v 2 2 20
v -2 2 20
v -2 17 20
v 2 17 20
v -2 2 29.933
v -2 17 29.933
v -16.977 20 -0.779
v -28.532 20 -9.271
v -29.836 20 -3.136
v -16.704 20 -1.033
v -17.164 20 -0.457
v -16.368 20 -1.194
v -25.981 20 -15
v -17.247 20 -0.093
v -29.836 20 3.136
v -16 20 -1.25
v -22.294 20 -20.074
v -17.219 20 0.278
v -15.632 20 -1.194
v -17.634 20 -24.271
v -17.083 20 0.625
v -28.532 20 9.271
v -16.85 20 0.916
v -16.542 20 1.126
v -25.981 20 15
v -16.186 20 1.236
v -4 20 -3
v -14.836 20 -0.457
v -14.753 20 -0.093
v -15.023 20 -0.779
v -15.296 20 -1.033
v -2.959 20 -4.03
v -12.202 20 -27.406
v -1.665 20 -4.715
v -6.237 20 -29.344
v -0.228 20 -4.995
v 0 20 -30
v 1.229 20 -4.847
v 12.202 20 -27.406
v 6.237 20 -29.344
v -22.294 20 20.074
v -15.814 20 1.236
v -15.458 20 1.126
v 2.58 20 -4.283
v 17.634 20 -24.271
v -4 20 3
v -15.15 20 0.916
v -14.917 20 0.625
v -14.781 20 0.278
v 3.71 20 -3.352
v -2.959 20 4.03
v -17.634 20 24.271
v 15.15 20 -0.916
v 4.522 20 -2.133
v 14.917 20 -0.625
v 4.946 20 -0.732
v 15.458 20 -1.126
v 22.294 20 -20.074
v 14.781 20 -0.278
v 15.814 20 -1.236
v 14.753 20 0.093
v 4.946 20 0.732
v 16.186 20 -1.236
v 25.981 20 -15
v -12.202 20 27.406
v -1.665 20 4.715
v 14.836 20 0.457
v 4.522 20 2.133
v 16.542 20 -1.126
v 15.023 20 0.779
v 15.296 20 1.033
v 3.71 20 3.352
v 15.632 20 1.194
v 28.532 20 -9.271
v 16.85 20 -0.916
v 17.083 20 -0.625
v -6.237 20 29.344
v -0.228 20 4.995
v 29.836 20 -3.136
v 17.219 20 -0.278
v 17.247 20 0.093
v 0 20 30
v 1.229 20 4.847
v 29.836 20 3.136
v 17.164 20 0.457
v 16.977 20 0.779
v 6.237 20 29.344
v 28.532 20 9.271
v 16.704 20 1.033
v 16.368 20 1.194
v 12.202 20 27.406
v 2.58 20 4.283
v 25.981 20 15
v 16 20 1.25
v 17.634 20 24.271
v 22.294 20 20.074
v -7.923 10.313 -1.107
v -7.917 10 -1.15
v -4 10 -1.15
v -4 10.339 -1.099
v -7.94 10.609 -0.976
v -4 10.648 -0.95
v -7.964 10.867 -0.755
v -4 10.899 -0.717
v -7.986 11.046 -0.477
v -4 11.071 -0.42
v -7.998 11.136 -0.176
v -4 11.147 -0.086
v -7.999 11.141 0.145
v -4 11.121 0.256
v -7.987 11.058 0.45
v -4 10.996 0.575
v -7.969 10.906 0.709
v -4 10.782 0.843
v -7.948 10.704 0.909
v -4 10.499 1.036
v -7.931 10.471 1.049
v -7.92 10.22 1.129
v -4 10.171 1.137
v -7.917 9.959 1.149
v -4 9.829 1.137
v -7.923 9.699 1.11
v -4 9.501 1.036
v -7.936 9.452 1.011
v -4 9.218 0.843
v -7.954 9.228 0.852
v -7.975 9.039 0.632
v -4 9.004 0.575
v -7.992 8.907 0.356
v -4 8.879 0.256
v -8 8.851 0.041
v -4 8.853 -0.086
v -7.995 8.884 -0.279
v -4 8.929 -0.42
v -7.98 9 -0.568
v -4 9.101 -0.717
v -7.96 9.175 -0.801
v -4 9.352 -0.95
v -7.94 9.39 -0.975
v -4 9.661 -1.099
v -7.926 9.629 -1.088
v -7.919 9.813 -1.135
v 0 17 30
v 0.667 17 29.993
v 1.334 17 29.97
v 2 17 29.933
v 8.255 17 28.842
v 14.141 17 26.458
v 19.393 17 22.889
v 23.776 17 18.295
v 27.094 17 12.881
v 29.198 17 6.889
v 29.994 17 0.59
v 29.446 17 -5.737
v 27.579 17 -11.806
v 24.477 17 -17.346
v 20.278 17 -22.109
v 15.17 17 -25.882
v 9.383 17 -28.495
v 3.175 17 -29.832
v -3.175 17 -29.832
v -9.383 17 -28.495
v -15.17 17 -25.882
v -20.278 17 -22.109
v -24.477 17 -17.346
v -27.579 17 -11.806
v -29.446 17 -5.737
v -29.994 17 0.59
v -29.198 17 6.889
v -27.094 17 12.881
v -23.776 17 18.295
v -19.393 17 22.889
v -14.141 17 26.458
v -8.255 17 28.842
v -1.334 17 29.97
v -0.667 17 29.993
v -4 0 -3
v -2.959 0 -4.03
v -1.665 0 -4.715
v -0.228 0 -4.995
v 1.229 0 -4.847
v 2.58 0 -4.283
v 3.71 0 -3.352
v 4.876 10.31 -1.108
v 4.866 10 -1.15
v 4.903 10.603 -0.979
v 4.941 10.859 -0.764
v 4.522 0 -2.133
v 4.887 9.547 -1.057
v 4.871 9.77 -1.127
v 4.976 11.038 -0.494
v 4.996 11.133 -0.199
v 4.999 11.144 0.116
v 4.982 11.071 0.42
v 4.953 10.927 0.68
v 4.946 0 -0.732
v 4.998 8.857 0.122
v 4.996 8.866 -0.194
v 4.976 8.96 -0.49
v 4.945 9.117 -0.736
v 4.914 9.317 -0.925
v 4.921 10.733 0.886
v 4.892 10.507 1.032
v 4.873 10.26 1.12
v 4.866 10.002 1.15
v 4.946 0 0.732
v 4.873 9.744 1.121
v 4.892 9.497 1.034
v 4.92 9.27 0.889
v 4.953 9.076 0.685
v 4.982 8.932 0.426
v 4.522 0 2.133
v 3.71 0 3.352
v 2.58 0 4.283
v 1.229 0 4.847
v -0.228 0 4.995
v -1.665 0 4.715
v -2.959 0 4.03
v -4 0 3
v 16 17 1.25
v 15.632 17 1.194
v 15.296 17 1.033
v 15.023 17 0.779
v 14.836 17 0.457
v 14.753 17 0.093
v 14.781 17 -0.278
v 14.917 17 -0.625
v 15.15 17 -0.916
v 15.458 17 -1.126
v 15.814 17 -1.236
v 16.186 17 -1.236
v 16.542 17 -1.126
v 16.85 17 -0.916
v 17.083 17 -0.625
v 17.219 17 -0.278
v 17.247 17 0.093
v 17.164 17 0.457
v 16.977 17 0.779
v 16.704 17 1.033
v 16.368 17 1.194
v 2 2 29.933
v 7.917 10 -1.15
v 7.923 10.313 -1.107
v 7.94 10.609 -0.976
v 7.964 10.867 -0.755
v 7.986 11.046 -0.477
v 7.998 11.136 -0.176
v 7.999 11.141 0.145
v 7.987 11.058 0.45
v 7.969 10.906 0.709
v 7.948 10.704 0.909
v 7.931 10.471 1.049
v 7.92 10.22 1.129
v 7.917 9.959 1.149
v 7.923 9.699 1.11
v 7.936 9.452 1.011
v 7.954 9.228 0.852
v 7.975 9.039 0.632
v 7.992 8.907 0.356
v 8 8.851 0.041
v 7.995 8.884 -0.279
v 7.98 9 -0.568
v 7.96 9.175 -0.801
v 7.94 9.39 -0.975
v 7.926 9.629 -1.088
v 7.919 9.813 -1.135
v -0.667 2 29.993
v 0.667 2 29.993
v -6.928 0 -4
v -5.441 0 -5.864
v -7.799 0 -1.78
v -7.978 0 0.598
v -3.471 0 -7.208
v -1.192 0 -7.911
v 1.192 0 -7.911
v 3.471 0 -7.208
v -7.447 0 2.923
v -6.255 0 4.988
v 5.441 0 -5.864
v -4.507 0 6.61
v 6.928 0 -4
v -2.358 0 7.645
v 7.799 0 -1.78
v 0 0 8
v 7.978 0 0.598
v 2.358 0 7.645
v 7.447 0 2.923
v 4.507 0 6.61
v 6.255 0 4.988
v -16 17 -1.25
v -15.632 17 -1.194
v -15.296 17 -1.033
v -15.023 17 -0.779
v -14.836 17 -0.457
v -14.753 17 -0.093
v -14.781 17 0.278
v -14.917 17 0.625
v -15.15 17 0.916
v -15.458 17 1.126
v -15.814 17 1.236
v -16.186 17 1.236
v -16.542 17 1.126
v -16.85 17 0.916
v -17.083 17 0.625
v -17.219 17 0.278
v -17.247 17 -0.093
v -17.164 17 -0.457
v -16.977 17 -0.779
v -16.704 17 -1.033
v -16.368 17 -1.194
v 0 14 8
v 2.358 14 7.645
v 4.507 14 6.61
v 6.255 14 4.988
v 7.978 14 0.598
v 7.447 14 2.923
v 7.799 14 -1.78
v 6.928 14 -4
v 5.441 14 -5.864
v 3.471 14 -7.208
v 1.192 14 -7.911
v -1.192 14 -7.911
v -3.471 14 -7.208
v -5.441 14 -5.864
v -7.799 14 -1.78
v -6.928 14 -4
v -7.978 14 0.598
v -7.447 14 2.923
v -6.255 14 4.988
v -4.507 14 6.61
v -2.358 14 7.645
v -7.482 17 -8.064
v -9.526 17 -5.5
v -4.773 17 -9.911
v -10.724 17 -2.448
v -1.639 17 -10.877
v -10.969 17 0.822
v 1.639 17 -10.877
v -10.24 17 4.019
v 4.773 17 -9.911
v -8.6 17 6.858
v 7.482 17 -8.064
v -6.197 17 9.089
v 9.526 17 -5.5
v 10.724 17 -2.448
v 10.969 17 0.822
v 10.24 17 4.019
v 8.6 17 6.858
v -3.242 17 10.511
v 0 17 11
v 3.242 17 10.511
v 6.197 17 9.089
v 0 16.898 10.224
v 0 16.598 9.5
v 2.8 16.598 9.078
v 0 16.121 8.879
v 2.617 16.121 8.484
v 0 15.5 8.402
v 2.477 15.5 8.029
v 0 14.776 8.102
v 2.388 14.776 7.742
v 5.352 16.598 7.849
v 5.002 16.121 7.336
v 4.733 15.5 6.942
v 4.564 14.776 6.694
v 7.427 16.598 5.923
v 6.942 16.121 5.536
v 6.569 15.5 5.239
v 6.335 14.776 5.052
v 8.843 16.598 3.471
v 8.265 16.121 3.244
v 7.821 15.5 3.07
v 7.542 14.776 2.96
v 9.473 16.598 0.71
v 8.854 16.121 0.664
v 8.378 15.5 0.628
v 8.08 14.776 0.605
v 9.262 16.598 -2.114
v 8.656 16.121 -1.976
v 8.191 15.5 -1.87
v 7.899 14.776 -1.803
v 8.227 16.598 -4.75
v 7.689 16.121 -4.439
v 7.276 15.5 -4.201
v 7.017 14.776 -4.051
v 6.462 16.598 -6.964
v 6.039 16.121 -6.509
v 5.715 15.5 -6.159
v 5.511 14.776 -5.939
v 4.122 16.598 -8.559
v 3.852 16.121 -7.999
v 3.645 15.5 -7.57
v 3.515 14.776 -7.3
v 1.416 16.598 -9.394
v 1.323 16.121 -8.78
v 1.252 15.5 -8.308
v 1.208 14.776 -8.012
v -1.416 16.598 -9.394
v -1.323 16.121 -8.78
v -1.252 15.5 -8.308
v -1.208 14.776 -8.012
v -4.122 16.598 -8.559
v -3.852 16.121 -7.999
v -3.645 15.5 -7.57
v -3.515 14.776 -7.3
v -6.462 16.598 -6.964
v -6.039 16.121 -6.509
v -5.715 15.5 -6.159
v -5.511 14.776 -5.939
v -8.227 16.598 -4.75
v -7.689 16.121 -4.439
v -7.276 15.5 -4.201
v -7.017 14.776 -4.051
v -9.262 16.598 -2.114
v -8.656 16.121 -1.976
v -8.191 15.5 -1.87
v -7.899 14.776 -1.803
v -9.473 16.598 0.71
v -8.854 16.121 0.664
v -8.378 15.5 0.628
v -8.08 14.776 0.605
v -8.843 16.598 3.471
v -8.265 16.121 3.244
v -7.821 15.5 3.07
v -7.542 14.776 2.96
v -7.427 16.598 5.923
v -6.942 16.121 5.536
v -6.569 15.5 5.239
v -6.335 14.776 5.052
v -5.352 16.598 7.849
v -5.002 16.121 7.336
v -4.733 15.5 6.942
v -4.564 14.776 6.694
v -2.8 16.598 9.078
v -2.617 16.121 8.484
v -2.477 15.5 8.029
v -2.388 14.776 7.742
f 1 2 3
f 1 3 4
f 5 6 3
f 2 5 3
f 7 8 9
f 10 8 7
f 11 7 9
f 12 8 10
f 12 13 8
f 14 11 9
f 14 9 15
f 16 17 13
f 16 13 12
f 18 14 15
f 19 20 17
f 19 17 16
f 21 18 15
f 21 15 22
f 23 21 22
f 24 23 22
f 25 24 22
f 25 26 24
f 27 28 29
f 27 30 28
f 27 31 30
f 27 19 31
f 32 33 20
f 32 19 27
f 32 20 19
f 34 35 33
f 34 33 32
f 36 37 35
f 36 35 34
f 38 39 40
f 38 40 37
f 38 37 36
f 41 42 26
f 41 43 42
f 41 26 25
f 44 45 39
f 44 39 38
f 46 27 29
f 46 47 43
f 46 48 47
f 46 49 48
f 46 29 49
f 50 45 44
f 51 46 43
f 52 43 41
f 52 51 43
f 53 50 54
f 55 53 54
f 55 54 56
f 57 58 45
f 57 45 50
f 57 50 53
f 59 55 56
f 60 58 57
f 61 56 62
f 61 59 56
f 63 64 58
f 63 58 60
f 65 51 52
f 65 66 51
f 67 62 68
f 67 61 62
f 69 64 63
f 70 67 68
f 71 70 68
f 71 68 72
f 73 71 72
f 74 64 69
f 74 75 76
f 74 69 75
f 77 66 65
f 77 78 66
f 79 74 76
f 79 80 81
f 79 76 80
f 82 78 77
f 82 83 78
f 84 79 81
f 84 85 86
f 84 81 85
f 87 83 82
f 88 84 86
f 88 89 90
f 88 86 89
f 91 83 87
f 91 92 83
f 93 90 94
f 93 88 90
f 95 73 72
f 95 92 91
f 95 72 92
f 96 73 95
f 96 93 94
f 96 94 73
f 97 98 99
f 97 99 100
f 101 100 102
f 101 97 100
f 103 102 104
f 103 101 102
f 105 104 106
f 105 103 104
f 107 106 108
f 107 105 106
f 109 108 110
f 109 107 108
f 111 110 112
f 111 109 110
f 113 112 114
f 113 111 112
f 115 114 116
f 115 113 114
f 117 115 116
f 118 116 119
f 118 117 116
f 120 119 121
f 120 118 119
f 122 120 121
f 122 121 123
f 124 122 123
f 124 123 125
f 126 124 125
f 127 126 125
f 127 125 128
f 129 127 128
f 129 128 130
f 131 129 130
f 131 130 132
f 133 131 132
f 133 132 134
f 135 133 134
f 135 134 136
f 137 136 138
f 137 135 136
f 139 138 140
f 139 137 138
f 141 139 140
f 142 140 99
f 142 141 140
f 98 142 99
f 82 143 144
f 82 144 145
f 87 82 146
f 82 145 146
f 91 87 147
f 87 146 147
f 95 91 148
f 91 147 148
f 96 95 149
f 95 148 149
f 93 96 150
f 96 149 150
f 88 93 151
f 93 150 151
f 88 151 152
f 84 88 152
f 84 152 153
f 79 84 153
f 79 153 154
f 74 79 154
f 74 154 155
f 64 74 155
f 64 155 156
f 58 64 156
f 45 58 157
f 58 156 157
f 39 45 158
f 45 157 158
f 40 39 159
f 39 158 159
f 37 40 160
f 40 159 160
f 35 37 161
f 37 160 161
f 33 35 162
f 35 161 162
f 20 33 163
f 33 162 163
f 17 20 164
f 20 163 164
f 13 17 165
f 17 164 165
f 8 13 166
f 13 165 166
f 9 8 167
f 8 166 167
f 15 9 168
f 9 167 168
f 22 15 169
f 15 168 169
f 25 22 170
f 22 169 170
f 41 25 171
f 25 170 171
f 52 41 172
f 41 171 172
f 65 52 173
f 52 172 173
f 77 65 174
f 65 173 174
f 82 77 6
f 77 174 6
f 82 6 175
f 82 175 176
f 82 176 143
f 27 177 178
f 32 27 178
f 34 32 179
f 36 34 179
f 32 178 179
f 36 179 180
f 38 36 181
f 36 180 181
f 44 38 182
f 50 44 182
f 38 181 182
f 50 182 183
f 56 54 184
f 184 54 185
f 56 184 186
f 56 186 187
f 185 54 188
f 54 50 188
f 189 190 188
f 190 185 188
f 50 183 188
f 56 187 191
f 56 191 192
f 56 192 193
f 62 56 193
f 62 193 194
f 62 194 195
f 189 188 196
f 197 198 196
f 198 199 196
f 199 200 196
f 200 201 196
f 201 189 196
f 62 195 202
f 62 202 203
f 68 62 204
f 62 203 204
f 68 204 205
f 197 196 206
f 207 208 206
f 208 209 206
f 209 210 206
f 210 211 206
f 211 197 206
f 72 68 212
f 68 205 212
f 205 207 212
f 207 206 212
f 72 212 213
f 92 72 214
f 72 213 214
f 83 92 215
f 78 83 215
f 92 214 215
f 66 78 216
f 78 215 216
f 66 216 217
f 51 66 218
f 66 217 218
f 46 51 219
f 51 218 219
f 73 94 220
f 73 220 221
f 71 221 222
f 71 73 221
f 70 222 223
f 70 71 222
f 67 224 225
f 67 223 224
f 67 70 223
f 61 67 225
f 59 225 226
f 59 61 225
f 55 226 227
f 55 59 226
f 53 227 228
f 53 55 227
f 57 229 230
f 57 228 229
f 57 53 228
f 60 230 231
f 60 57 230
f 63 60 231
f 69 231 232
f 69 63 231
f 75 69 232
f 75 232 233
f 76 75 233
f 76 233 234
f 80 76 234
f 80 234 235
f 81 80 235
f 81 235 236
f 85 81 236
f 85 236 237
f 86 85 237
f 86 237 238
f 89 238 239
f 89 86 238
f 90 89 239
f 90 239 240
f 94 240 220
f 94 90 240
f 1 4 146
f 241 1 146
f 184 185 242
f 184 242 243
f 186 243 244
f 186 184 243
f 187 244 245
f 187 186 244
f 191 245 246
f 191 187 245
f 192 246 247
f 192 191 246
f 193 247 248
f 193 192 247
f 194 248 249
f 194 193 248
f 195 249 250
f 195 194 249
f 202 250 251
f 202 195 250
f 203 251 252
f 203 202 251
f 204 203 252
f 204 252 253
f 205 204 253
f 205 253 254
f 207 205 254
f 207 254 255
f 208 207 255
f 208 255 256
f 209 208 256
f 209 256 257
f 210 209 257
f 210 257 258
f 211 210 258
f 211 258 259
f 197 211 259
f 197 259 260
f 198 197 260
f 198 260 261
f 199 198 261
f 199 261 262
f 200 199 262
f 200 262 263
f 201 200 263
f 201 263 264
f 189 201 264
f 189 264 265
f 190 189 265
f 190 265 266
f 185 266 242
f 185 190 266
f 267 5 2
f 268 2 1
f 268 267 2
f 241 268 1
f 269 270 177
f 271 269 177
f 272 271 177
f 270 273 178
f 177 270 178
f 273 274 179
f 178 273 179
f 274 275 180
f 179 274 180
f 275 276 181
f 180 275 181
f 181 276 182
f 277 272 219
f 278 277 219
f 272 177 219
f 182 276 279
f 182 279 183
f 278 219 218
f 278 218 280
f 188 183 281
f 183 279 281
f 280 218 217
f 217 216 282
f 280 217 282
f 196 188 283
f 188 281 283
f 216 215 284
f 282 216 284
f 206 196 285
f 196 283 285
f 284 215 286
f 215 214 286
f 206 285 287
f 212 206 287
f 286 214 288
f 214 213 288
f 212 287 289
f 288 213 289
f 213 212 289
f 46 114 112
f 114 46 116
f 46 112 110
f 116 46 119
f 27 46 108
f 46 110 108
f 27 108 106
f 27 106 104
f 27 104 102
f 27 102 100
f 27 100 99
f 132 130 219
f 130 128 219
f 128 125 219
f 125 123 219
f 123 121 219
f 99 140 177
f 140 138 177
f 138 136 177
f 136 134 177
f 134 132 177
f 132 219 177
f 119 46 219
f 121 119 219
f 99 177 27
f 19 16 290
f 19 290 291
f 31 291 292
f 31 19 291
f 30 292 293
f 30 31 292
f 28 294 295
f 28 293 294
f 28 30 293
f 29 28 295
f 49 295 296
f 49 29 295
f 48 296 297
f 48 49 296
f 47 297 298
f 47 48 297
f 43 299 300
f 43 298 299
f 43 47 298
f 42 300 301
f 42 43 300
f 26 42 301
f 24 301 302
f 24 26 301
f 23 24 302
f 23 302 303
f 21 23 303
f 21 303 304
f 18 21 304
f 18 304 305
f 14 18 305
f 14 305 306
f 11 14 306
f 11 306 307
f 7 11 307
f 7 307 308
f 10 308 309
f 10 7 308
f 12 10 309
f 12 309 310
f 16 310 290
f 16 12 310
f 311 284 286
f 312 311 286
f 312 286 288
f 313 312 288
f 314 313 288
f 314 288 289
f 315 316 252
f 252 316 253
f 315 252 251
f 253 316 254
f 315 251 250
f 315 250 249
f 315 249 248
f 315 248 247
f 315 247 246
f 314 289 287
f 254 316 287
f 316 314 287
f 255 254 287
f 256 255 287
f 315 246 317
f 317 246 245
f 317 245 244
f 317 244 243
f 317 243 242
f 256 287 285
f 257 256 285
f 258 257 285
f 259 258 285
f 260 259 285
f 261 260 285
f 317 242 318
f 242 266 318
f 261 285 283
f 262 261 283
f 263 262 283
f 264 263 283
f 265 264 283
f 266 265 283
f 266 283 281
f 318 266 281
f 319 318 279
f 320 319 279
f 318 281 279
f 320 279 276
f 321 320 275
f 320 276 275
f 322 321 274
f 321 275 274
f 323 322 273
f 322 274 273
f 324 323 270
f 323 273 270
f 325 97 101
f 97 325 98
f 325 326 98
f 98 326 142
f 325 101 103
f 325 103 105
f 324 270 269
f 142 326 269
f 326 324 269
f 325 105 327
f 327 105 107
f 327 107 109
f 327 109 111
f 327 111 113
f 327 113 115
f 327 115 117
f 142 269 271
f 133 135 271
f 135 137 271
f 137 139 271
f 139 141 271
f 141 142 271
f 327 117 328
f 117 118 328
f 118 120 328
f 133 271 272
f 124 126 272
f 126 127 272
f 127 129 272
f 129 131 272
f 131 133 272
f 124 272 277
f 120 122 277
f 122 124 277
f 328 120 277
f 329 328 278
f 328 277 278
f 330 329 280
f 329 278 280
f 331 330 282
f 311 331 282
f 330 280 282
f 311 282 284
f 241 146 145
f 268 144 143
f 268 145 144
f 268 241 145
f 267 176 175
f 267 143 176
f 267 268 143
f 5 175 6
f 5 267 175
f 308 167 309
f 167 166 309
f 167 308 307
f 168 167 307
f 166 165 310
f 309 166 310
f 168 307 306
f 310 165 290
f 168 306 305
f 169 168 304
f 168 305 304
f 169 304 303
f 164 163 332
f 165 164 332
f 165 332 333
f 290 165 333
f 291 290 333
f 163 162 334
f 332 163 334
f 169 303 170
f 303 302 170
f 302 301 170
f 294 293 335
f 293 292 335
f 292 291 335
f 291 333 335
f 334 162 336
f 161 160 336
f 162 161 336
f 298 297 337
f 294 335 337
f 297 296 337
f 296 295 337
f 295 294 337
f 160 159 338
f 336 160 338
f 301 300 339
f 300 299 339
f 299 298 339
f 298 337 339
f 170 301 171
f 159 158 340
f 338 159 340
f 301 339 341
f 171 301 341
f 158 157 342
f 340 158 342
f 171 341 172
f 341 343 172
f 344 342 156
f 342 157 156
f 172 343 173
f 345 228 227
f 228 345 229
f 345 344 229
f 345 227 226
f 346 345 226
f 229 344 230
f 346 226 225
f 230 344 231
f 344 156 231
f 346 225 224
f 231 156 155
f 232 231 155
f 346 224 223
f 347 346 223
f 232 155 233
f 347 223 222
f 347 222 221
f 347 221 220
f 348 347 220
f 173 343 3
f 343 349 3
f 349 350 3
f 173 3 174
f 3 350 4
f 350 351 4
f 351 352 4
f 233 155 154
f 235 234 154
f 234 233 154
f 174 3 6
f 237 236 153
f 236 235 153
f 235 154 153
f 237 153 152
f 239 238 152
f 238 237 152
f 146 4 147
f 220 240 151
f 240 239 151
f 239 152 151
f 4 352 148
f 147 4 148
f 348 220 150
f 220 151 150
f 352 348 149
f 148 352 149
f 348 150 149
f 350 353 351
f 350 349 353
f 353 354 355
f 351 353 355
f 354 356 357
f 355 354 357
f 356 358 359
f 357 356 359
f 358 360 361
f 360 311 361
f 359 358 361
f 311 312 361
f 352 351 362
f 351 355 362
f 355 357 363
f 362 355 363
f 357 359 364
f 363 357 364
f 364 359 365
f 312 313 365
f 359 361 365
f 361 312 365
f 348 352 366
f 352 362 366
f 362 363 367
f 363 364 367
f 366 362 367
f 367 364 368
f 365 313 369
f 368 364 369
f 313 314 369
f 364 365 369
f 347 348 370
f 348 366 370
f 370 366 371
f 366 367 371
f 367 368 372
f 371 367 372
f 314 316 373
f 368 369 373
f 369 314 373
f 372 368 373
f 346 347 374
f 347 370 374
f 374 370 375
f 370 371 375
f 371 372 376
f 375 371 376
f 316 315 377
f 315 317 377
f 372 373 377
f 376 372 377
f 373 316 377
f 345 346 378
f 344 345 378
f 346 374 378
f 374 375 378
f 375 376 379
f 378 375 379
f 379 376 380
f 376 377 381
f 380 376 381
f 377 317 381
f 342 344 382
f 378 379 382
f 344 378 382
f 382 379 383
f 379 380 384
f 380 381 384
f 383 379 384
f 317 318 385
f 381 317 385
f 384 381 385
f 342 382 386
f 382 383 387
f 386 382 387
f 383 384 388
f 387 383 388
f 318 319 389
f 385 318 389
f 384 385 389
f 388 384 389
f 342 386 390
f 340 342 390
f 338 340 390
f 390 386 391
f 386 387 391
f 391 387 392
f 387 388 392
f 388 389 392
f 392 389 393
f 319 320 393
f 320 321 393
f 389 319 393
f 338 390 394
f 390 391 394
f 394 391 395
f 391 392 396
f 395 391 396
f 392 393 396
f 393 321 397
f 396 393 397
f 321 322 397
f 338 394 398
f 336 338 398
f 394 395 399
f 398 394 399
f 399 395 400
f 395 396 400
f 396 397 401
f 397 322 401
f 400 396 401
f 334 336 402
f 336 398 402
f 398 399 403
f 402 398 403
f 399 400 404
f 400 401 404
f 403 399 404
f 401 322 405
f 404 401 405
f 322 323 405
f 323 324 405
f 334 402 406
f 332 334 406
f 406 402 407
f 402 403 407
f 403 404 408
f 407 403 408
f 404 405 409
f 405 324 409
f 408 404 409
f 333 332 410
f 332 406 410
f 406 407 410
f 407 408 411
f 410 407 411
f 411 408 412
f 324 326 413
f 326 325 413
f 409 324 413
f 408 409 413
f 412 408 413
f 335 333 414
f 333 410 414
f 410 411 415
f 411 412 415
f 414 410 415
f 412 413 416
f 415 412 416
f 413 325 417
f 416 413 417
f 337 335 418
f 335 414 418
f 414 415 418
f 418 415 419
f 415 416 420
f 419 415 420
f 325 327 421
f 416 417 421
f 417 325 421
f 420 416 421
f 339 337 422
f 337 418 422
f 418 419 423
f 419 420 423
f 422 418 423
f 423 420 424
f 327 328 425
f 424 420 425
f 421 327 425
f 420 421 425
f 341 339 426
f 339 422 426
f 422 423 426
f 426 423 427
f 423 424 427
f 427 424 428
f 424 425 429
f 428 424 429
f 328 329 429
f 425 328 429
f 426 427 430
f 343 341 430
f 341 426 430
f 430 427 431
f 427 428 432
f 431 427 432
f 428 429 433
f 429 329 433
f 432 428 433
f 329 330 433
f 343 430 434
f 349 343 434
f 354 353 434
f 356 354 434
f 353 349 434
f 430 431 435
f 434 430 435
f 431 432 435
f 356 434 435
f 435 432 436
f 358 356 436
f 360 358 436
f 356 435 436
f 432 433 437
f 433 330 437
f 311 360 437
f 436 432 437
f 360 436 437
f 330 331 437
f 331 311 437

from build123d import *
from build123d.topology import SkipClean

# Parameters (mm, degrees)
SKETCH_1_R               = 8
EXTRUDE_1_DEPTH          = 17
SKETCH_2_R               = 30
EXTRUDE_2_DEPTH          = 3
CUT_EXTRUDE_1_DEPTH      = 47.904158
CUT_EXTRUDE_2_DEPTH      = 50.558047
CUT_EXTRUDE_2_DEPTH_BACK = 50.558047
SKETCH_4_R               = 1.15
EXTRUDE_START            = 15
EXTRUDE_3_DEPTH          = 15
FILLET_1_R               = 3
CUT_EXTRUDE_3_DEPTH      = 46.70558
CUT_EXTRUDE_3_DEPTH_BACK = 46.70558
SKETCH_6_R               = 1.25


with BuildPart() as part:
    # 草图1 → 凸台-拉伸1 (new body)
    with BuildSketch(Plane(origin=(0, 0, 0), x_dir=(1, 0, 0), z_dir=(0, 1, 0))):
        with Locations(Location((0, 0, 0), (0, 0, 270))):
            Circle(SKETCH_1_R)
    extrude(amount=EXTRUDE_1_DEPTH)

    # 草图2 → 凸台-拉伸2 (add)
    with BuildSketch(Plane(origin=(0, 17, 0), x_dir=(1, 0, 0), z_dir=(0, 1, 0))):
        with Locations(Location((0, 0, 0), (0, 0, 270))):
            Circle(SKETCH_2_R)
    extrude(amount=EXTRUDE_2_DEPTH)

    # 草图3 → 切除-拉伸1 (cut, through all)
    with BuildSketch(Plane.XZ):
        with BuildLine():
            Line((-4, 3), (-4, -3))
            ThreePointArc((-4, -3), (5, 0), (-4, 3))
        make_face()
    extrude(amount=-CUT_EXTRUDE_1_DEPTH, mode=Mode.SUBTRACT)

    # 草图4 → 切除-拉伸2 (cut, two sides: drawn at the far end of the back side and taken through both)
    with BuildSketch(Plane(origin=(-4, 0, 0), x_dir=(0, 0, -1), z_dir=(1, 0, 0)).offset(-CUT_EXTRUDE_2_DEPTH_BACK)):
        with Locations((0, 10)):
            Circle(SKETCH_4_R)
    extrude(amount=CUT_EXTRUDE_2_DEPTH + CUT_EXTRUDE_2_DEPTH_BACK, mode=Mode.SUBTRACT)

    # 草图5 → 凸台-拉伸3 (add)
    with SkipClean():  # the faces are left unmerged after this step: merging them gives an invalid solid
        with BuildSketch(Plane.XZ.offset(-17).offset(EXTRUDE_START)):
            with BuildLine():
                Line((-2, 29.933259), (-2, 20))
                Line((-2, 20), (2, 20))
                Line((2, 20), (2, 29.933259))
                ThreePointArc((2, 29.933259), (0, 30), (-2, 29.933259))
            make_face()
        extrude(amount=-EXTRUDE_3_DEPTH)

    # 圆角1
    fillet_1_edges = [part.edges().sort_by_distance(p)[0] for p in [
        (0, 17, -8),
    ]]
    fillet(fillet_1_edges, radius=FILLET_1_R)

    # 草图6 → 切除-拉伸3 (cut, two sides: drawn at the far end of the back side and taken through both)
    with SkipClean():  # the faces are left unmerged after this step: merging them gives an invalid solid
        with BuildSketch(Plane.XZ.offset(-17).offset(-CUT_EXTRUDE_3_DEPTH_BACK)):
            with Locations(Location((-16, 0, 0), (0, 0, 270))):
                Circle(SKETCH_6_R)
            with Locations(Location((16, 0, 0), (0, 0, 90))):
                Circle(SKETCH_6_R)
        extrude(amount=CUT_EXTRUDE_3_DEPTH + CUT_EXTRUDE_3_DEPTH_BACK, mode=Mode.SUBTRACT)


solid = part.part
